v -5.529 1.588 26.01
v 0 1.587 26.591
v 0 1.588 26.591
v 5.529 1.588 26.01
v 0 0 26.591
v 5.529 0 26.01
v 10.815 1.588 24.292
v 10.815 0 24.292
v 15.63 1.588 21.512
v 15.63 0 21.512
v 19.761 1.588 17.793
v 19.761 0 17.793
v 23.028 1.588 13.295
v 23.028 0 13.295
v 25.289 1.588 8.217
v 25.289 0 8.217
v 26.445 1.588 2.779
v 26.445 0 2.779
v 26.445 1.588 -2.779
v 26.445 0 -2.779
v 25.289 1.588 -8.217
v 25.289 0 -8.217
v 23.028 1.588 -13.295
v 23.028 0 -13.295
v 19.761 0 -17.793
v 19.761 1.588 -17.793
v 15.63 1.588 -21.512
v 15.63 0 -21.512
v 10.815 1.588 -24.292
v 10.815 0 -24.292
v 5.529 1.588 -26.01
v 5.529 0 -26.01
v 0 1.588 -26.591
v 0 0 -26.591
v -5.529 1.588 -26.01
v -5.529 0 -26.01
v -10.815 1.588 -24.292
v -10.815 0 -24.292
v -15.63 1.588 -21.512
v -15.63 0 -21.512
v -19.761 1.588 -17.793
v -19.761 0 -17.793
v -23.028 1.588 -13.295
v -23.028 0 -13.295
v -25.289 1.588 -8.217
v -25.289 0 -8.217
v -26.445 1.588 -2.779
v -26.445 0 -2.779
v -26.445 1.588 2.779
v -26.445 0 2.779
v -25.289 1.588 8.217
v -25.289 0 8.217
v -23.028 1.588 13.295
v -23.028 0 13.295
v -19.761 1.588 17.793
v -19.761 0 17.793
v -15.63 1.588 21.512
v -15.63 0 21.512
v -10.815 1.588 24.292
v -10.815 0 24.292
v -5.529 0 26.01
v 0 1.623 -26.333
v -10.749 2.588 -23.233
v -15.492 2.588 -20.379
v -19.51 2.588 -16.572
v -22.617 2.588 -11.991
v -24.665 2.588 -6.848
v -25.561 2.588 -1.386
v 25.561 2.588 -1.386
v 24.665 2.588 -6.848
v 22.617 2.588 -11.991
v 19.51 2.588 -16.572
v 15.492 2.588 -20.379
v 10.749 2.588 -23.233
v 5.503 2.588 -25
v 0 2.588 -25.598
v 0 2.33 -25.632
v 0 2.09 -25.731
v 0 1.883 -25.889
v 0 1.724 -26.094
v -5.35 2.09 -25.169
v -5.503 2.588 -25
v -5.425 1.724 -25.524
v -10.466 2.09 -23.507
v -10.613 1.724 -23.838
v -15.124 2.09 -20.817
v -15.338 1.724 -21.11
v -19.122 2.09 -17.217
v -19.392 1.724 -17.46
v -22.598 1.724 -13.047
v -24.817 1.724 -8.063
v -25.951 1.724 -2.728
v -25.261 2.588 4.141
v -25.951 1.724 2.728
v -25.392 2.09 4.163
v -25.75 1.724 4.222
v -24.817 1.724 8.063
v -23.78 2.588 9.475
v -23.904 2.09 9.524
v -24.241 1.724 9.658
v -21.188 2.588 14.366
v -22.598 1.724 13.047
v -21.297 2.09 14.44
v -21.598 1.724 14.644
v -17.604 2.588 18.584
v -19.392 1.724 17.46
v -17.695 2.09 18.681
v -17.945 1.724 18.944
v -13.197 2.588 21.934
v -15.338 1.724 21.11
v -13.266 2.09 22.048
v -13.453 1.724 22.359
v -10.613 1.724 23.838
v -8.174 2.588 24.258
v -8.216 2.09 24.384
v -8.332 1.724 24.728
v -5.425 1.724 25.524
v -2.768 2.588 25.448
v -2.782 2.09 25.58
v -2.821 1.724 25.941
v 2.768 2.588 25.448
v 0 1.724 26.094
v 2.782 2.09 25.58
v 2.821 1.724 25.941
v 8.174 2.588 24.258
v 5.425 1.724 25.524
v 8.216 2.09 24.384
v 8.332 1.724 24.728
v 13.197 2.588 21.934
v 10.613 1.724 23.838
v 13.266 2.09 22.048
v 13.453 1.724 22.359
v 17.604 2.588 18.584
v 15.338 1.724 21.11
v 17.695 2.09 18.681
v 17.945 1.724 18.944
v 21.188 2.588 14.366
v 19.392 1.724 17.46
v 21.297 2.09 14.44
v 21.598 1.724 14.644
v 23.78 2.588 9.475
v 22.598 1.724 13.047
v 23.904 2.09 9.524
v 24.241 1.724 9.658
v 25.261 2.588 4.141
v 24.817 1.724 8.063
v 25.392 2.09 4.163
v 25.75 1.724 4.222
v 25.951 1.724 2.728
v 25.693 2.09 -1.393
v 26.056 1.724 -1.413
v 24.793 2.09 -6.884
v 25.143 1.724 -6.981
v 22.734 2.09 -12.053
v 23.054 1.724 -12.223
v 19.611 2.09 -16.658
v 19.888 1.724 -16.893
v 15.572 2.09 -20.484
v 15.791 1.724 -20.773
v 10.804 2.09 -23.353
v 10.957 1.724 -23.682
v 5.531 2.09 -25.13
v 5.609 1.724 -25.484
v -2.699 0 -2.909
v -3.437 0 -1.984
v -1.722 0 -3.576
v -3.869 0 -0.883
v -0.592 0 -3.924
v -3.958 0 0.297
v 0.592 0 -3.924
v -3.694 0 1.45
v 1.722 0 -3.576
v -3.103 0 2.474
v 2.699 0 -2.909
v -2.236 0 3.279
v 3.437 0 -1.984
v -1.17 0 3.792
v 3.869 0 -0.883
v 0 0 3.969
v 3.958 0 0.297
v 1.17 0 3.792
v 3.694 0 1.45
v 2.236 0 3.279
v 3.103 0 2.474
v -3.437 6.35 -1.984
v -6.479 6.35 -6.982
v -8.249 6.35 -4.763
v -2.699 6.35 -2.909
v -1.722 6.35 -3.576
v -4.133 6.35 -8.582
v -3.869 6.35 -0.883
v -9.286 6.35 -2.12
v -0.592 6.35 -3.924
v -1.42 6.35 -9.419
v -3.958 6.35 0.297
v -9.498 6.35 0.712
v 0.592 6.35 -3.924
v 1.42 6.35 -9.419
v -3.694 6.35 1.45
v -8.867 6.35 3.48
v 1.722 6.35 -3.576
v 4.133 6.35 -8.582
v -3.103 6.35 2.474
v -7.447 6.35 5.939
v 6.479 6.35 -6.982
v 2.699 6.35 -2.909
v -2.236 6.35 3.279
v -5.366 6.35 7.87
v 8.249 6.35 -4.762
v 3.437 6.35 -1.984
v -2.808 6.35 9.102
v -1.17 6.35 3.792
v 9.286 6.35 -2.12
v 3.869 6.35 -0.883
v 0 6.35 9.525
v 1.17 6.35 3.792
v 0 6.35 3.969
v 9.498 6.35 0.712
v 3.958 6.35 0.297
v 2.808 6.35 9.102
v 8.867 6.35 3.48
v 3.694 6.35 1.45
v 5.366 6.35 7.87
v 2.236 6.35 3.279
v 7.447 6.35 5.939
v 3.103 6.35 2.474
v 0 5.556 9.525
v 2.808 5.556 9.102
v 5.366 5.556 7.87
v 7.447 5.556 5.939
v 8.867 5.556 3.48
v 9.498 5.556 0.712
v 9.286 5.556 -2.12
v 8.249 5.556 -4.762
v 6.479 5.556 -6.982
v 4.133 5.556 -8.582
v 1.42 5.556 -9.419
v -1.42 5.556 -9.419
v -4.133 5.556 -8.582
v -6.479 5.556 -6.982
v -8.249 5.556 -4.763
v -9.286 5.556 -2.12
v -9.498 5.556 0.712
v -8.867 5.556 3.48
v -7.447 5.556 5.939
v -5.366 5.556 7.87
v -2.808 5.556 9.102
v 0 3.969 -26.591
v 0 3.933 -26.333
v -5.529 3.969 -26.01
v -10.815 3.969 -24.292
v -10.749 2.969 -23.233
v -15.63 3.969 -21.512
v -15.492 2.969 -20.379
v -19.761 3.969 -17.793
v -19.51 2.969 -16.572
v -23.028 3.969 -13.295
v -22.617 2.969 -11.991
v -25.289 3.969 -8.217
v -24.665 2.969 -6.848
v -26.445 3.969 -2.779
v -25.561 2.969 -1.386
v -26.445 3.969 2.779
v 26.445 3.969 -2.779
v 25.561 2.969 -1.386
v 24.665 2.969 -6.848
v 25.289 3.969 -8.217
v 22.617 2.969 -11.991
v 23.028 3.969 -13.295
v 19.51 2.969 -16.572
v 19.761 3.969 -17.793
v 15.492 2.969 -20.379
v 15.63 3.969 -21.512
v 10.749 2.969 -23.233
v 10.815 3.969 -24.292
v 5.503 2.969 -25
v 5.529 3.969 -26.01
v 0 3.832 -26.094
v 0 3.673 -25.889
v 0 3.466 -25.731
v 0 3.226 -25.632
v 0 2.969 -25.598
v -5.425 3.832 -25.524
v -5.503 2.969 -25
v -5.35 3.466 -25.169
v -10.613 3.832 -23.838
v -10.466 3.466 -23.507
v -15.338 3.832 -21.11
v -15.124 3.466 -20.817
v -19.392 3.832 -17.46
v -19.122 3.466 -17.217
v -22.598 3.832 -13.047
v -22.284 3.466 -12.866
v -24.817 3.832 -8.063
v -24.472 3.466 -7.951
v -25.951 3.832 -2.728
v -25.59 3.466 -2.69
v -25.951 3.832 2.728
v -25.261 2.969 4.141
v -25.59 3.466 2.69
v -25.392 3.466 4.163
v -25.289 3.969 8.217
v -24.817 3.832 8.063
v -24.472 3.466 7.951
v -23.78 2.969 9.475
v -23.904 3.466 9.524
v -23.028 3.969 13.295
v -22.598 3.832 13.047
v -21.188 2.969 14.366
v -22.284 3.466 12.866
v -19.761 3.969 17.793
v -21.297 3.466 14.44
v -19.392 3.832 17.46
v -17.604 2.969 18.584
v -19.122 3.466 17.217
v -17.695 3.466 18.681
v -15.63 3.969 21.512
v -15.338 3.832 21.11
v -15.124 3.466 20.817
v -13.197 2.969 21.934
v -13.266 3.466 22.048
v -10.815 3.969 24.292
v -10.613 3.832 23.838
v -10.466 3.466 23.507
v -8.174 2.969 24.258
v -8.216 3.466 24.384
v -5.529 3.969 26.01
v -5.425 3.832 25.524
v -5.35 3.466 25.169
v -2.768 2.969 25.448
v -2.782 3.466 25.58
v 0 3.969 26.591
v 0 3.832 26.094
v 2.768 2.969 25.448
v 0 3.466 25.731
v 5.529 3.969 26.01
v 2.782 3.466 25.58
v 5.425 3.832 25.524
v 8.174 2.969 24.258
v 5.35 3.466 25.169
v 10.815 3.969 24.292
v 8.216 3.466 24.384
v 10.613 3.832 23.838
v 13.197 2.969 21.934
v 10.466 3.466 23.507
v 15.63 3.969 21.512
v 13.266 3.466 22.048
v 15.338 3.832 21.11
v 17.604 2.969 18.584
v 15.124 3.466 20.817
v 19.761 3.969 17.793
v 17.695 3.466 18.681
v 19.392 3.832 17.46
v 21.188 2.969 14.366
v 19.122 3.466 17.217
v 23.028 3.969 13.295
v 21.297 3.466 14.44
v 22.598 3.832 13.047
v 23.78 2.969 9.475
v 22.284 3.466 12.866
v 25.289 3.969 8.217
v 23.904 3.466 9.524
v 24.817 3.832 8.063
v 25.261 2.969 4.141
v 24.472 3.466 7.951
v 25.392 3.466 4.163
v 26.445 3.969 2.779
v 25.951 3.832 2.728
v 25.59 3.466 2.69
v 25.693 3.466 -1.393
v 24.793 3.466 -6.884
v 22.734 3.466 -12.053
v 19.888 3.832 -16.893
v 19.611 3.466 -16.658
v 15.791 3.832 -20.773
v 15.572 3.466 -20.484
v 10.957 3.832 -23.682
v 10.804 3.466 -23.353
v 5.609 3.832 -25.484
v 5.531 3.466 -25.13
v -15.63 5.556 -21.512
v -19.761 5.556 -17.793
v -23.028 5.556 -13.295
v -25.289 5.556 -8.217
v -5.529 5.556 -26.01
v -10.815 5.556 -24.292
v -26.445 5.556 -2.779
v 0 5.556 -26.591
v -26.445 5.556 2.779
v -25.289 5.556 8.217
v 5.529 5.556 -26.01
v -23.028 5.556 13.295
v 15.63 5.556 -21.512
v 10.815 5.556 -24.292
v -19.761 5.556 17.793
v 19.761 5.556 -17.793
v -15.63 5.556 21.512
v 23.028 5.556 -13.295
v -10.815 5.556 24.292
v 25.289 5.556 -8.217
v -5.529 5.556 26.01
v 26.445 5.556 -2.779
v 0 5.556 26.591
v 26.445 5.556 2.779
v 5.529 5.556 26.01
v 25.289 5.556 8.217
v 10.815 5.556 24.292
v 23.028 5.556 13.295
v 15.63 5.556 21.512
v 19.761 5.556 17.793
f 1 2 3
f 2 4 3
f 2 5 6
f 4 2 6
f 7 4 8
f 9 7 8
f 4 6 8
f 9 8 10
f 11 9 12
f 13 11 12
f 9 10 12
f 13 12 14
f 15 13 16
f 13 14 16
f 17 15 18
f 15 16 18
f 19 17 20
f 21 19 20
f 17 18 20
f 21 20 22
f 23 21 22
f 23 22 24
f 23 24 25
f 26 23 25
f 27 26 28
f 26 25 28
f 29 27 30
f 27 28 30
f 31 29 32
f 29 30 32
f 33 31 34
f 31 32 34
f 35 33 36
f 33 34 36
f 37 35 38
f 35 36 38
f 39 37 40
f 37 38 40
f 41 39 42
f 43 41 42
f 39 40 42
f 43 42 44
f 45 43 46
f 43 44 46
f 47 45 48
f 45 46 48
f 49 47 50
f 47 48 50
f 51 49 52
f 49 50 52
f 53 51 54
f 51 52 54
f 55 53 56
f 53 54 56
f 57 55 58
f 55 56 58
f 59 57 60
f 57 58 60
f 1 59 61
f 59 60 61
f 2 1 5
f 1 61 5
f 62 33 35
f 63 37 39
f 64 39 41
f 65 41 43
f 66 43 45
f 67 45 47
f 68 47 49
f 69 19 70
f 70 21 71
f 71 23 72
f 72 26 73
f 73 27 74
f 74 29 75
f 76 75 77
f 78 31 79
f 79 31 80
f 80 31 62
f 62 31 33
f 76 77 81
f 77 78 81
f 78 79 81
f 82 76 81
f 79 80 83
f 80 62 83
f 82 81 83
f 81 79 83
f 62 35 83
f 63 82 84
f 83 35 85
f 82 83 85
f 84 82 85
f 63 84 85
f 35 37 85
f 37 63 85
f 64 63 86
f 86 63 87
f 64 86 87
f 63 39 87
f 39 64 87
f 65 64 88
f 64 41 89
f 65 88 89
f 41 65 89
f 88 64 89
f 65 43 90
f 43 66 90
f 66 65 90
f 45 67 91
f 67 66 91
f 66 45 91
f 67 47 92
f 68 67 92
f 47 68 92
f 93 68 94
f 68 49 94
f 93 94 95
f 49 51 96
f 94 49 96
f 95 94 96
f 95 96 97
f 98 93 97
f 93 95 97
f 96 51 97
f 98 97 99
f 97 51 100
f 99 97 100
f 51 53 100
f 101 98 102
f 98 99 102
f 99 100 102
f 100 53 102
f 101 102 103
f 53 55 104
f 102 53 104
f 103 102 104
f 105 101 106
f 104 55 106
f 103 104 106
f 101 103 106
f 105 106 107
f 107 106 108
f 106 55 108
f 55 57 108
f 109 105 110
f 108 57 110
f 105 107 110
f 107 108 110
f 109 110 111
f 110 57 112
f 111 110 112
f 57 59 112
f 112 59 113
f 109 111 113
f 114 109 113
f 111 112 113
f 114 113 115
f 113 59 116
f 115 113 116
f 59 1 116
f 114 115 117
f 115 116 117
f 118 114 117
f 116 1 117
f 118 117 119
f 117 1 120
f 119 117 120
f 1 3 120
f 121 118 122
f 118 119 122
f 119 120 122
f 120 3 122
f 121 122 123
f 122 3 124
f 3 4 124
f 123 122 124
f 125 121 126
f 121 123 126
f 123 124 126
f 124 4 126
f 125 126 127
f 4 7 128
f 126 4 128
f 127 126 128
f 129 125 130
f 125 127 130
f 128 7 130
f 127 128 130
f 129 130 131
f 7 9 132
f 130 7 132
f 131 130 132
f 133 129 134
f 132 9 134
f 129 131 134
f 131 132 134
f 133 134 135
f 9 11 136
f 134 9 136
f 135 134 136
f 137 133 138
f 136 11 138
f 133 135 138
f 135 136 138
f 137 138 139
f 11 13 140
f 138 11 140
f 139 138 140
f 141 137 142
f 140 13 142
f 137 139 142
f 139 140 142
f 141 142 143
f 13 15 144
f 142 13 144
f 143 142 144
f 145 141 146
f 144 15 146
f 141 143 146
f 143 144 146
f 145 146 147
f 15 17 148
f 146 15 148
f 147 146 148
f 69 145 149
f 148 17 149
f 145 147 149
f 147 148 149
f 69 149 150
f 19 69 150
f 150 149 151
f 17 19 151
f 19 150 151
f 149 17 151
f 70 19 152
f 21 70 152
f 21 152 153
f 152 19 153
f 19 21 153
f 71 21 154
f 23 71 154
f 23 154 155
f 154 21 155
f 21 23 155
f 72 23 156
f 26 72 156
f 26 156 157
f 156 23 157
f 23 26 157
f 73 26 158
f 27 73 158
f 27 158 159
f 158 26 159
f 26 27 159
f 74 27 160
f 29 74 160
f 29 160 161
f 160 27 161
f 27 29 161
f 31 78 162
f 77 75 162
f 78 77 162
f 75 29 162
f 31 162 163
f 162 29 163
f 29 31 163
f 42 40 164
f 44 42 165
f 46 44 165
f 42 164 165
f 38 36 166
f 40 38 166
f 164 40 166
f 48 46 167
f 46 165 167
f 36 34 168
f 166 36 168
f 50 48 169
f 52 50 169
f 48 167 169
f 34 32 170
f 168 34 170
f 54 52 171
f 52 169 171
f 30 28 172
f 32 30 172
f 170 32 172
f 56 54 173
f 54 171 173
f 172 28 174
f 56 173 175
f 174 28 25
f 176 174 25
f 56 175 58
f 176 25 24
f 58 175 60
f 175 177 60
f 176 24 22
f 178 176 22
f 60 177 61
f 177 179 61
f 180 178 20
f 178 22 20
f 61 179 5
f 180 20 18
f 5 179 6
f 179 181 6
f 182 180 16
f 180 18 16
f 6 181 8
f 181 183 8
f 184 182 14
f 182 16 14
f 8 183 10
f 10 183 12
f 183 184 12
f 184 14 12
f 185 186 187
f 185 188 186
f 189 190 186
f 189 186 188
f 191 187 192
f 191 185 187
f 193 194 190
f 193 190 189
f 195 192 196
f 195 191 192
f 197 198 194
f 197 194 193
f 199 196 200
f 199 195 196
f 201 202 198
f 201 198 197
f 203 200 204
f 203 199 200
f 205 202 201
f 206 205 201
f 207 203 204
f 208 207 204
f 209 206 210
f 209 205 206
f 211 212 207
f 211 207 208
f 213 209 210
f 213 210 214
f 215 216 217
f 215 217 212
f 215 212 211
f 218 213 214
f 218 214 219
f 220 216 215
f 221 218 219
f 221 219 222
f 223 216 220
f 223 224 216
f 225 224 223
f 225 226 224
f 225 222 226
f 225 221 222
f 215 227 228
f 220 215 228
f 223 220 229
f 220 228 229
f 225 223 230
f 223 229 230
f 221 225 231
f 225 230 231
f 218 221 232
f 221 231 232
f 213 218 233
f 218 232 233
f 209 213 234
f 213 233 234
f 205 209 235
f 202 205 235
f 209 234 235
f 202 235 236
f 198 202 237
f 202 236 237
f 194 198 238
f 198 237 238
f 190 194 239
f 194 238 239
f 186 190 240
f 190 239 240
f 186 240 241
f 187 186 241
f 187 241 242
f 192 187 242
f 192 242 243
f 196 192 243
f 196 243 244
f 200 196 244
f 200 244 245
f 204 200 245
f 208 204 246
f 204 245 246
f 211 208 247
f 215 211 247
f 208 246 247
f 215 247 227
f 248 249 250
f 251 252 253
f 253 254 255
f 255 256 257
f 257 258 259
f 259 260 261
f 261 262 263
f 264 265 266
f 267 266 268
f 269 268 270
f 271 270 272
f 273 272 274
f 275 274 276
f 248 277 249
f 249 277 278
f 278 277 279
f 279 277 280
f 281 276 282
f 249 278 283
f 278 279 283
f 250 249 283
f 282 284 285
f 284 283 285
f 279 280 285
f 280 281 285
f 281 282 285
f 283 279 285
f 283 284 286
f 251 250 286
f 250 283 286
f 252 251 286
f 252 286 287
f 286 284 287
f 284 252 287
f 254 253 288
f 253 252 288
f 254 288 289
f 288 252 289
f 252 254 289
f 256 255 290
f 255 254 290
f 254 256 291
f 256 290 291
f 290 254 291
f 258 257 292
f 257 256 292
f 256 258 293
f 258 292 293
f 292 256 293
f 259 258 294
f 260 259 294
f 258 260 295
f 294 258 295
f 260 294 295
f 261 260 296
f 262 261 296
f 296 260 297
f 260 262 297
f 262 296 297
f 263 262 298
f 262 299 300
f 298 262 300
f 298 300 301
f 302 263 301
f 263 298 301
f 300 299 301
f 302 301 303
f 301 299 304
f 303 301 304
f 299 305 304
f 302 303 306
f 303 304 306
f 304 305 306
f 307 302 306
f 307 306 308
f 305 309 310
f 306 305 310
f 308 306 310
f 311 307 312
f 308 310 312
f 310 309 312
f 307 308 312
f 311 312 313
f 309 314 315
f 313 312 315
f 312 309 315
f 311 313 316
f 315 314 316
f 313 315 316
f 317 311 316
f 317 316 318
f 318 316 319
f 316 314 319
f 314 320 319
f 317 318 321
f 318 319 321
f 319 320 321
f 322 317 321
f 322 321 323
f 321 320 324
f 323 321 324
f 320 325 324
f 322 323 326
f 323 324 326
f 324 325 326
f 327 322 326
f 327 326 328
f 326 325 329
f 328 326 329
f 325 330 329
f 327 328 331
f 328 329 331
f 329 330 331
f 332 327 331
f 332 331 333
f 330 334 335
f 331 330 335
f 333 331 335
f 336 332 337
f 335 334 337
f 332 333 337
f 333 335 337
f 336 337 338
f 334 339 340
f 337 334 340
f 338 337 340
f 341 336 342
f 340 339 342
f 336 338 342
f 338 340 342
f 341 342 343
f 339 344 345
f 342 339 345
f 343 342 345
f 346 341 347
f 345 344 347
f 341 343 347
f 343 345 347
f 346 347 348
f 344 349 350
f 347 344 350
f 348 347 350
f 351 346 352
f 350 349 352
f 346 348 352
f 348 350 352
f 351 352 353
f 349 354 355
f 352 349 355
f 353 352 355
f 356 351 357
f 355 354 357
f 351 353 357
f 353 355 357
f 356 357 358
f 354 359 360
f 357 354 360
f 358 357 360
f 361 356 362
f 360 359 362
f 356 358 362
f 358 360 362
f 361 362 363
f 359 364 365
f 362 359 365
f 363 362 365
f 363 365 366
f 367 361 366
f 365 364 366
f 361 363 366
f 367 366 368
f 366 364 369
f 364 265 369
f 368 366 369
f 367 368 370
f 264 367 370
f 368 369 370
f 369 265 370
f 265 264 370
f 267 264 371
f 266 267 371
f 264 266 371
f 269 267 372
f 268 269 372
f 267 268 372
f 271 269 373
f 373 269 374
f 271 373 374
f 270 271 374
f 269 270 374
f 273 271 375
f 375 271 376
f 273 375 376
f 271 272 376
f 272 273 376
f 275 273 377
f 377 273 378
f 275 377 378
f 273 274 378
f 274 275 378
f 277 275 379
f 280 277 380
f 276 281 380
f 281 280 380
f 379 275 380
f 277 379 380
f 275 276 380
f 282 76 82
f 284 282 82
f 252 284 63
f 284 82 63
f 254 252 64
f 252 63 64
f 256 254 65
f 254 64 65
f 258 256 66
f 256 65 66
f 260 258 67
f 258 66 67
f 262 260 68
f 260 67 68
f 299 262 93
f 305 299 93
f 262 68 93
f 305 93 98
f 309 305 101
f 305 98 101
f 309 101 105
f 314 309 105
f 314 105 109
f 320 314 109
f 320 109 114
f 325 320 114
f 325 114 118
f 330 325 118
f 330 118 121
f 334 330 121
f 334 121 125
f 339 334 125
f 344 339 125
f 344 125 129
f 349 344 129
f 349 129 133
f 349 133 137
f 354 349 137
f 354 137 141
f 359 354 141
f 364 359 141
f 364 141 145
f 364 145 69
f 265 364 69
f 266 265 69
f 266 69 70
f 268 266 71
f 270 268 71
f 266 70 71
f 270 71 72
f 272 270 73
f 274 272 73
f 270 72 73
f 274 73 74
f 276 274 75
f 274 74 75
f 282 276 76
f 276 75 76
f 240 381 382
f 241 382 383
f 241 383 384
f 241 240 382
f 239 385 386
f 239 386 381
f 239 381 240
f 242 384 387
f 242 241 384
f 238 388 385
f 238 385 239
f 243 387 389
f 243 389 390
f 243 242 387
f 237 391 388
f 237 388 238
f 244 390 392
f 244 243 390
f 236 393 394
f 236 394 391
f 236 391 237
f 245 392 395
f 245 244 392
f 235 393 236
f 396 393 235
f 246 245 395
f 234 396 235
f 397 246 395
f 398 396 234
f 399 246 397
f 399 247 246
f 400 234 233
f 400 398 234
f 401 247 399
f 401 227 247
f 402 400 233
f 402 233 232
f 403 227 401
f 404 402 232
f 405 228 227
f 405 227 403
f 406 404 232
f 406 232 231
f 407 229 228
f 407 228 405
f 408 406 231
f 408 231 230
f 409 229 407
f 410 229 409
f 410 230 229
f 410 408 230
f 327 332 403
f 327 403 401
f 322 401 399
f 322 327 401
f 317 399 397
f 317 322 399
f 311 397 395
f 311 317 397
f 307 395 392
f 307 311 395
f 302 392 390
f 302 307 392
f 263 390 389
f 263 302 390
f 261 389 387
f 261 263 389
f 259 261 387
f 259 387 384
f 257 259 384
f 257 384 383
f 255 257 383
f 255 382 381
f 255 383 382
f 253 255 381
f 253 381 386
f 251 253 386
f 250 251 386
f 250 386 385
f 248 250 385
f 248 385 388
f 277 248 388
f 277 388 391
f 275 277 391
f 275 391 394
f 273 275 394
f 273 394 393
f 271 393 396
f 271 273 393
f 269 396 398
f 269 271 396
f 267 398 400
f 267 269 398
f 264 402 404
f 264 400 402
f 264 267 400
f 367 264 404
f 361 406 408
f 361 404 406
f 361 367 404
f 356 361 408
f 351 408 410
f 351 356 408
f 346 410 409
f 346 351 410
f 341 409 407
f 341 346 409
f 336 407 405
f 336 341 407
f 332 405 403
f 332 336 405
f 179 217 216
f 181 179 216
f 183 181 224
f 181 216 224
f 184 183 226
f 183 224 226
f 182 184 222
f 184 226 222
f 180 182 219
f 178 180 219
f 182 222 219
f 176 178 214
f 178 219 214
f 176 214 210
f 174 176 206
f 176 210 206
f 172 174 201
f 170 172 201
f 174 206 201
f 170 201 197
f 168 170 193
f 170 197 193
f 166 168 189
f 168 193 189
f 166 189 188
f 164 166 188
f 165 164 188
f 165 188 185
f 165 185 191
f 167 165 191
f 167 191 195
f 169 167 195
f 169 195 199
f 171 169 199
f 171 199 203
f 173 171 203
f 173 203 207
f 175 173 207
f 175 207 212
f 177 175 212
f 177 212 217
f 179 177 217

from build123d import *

# Parameters (mm, degrees)
SKETCH1_R           = 26.590625
BOSS_EXTRUDE1_DEPTH = 1.5875
SKETCH2_R           = 25.5984375
BOSS_EXTRUDE2_DEPTH = 2.38125
SKETCH3_R           = 26.590625
BOSS_EXTRUDE3_DEPTH = 1.5875
SKETCH5_R           = 9.525
BOSS_EXTRUDE4_DEPTH = 0.79375
SKETCH6_R           = 3.96875
CUT_EXTRUDE1_DEPTH  = 39.137188881
FILLET1_R           = 1
FILLET2_R           = 1


with BuildPart() as part:
    # Sketch1 → Boss-Extrude1 (new body)
    with BuildSketch(Plane(origin=(0, 0, 0), x_dir=(1, 0, 0), z_dir=(0, 1, 0))):
        with Locations(Location((0, 0, 0), (0, 0, 270))):
            Circle(SKETCH1_R)
    extrude(amount=BOSS_EXTRUDE1_DEPTH)

    # Sketch2 → Boss-Extrude2 (add)
    with BuildSketch(Plane(origin=(0, 1.5875, 0), x_dir=(1, 0, 0), z_dir=(0, 1, 0))):
        with Locations(Location((0, 0, 0), (0, 0, 90))):
            Circle(SKETCH2_R)
    extrude(amount=BOSS_EXTRUDE2_DEPTH)

    # Sketch3 → Boss-Extrude3 (add)
    with BuildSketch(Plane(origin=(0, 3.96875, 0), x_dir=(1, 0, 0), z_dir=(0, 1, 0))):
        with Locations(Location((0, 0, 0), (0, 0, 270))):
            Circle(SKETCH3_R)
    extrude(amount=BOSS_EXTRUDE3_DEPTH)

    # Sketch5 → Boss-Extrude4 (add)
    with BuildSketch(Plane(origin=(0, 5.55625, 0), x_dir=(1, 0, 0), z_dir=(0, 1, 0))):
        with Locations(Location((0, 0, 0), (0, 0, 270))):
            Circle(SKETCH5_R)
    extrude(amount=BOSS_EXTRUDE4_DEPTH)

    # Sketch6 → Cut-Extrude1 (cut, through all)
    with BuildSketch(Plane(origin=(0, 6.35, 0), x_dir=(1, 0, 0), z_dir=(0, 1, 0))):
        with Locations(Location((0, 0, 0), (0, 0, 270))):
            Circle(SKETCH6_R)
    extrude(amount=-CUT_EXTRUDE1_DEPTH, mode=Mode.SUBTRACT)

    # Fillet1
    # the kernel refuses this fillet: 1 mm, written as the material it adds along each edge
    with BuildSketch(Plane(origin=(0, 1.5875, 0), x_dir=(0, 0, -1), z_dir=(1, 0, 0))) as fillet1_piece_1_section:
        with BuildLine():
            CenterArc((25.5984375 + FILLET1_R, FILLET1_R), FILLET1_R, 180, 90)
            Line((25.5984375 + FILLET1_R, 0), (25.5984375, 0))
            Line((25.5984375, 0), (25.5984375, FILLET1_R))
        make_face()
    fillet1_piece_1 = revolve(axis=Axis((0, 1.5875, 0), (0, 1, 0)), mode=Mode.PRIVATE)
    fillet1_piece_1 = fillet1_piece_1 & Plane(origin=(0, 1.858804506, 0), x_dir=(0, 0, 1), z_dir=(0, -1, 0)) * Cylinder(26.590625, 107, mode=Mode.PRIVATE)
    add(fillet1_piece_1)

    # Fillet2
    # the kernel refuses this fillet: 1 mm, written as the material it adds along each edge
    with BuildSketch(Plane(origin=(0, 3.96875, 0), x_dir=(0, 0, -1), z_dir=(1, 0, 0))) as fillet2_piece_1_section:
        with BuildLine():
            CenterArc((25.5984375 + FILLET2_R, -FILLET2_R), FILLET2_R, 90, 90)
            Line((25.5984375 + FILLET2_R, 0), (25.5984375, 0))
            Line((25.5984375, 0), (25.5984375, -FILLET2_R))
        make_face()
    fillet2_piece_1 = revolve(axis=Axis((0, 3.96875, 0), (0, 1, 0)), mode=Mode.PRIVATE)
    fillet2_piece_1 = fillet2_piece_1 & Plane(origin=(0, 3.697445494, 0), x_dir=(0, 0, 1), z_dir=(0, -1, 0)) * Cylinder(26.590625, 107, mode=Mode.PRIVATE)
    add(fillet2_piece_1)


solid = part.part
